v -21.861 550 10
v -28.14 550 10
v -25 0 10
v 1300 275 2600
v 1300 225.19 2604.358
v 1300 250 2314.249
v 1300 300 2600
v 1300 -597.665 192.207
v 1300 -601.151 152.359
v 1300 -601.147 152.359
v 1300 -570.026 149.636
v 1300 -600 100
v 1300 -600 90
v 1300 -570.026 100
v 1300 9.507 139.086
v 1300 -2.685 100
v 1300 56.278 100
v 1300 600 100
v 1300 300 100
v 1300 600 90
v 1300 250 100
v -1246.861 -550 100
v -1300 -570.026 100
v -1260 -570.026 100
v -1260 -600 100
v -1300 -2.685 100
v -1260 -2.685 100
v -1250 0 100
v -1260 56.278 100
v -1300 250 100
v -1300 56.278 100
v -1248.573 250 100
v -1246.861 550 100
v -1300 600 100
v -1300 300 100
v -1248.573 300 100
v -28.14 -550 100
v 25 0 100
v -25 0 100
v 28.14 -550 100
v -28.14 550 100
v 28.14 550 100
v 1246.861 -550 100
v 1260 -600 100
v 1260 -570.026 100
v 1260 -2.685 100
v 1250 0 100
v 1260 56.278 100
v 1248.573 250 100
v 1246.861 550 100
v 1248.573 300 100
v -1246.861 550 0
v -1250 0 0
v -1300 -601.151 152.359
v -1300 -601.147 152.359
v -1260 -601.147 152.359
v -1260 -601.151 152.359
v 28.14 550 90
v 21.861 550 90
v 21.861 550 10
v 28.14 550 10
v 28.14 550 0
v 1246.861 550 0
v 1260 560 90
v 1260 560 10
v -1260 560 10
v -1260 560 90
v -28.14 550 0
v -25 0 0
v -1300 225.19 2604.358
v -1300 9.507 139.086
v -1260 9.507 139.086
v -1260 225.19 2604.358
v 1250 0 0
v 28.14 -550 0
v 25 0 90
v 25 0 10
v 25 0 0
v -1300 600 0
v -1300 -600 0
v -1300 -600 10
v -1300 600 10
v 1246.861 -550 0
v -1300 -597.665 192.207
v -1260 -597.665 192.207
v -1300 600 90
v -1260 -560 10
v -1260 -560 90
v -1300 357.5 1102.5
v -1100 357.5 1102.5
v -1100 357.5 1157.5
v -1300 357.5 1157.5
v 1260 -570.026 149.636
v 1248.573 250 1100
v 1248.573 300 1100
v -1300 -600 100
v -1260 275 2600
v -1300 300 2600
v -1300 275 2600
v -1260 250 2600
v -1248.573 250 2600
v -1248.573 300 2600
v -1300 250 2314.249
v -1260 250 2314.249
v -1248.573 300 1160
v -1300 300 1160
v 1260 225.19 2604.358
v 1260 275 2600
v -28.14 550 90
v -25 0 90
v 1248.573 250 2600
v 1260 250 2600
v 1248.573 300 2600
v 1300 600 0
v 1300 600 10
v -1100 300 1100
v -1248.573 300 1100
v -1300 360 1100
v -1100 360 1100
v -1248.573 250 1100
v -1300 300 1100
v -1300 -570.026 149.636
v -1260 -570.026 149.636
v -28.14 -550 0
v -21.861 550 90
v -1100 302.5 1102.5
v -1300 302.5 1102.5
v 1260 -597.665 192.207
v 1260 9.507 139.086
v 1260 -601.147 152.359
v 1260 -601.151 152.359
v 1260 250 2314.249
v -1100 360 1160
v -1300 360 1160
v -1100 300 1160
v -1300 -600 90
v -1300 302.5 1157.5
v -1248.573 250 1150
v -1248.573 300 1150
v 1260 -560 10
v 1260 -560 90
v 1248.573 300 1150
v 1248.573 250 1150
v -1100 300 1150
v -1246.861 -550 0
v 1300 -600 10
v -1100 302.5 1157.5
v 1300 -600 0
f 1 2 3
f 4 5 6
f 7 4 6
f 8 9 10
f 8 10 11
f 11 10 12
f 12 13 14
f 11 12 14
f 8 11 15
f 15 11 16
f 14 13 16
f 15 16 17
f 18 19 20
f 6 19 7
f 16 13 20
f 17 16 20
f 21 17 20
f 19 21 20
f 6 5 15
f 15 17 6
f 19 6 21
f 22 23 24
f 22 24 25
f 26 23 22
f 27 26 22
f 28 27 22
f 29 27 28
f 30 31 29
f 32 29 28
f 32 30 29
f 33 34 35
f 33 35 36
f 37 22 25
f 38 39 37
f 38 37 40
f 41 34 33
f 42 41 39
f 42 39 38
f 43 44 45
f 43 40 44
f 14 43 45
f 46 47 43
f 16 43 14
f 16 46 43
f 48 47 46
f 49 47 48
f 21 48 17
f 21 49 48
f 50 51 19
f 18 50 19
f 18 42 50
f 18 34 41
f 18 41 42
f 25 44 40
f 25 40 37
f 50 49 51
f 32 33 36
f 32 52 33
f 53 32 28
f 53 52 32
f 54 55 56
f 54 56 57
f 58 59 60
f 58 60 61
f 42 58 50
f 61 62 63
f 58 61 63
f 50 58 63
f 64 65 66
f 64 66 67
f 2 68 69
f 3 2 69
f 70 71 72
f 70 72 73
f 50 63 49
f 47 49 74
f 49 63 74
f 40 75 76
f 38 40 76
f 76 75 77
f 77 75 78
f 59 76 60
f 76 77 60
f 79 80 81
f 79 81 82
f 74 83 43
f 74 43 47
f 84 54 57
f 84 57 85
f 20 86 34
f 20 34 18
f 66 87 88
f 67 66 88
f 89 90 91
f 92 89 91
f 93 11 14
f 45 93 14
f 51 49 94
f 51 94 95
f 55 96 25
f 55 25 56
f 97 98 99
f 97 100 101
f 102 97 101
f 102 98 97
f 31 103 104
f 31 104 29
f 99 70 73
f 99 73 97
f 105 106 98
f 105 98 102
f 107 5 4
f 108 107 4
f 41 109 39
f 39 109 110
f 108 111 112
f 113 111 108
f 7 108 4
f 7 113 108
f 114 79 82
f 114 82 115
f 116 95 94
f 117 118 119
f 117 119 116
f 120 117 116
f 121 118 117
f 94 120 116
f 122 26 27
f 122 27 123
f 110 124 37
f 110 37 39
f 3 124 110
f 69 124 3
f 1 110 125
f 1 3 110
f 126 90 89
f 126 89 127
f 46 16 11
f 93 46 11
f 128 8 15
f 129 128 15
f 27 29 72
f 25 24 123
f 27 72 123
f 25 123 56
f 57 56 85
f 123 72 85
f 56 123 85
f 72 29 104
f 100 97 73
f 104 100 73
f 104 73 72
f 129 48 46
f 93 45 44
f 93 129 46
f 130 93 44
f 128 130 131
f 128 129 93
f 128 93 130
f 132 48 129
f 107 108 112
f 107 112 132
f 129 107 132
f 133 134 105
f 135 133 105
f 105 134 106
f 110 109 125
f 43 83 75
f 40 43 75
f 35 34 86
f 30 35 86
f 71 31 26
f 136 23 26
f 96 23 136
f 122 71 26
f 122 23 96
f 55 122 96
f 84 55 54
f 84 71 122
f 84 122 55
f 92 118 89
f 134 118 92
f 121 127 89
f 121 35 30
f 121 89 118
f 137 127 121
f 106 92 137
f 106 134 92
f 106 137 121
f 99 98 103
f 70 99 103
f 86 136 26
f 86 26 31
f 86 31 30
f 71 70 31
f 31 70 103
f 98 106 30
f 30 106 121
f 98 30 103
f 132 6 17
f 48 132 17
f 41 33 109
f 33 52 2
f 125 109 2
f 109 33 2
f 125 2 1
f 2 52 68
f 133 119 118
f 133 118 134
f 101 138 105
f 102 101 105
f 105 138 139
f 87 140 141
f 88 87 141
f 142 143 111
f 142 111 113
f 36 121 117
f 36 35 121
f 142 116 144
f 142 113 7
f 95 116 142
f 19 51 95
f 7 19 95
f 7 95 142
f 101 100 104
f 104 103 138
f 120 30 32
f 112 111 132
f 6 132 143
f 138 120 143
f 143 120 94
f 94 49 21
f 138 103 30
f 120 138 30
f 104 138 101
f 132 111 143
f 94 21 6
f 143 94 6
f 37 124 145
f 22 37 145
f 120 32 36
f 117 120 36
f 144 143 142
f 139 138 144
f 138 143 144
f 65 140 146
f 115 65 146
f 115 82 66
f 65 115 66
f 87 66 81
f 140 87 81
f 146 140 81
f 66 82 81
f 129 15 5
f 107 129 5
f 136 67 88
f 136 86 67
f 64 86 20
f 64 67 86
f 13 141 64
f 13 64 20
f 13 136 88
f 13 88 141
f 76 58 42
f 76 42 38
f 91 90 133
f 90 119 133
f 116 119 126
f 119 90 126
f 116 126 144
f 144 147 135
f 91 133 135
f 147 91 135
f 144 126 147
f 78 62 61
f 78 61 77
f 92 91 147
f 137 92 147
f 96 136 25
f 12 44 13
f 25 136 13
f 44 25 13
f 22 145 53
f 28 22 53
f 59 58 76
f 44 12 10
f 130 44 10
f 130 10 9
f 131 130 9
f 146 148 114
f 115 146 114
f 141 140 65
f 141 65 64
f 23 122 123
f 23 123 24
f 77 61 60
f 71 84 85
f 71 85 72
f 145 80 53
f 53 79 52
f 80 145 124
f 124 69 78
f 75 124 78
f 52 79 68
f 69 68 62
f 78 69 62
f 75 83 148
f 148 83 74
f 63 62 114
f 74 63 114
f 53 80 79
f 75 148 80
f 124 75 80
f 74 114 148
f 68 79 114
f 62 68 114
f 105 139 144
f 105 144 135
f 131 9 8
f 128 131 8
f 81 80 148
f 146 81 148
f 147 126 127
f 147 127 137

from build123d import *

# Parameters (mm, degrees)
F0_W          = 2600
F0_H          = 1200
F1_DEPTH      = 100
F2_W          = 40
F2_H          = 80
F3_DEPTH      = 2600.001
F4_W          = 40
F4_H          = 80
F5_DEPTH      = 1160.001
F6_W          = 90
F6_H          = 80
F7_DEPTH      = 550
F7_DEPTH_BACK = 550
F8_W          = 48.5726841614
F8_H          = 50
F8_W_2        = 51.4265014179
F9_DEPTH      = 2500
F11_DEPTH     = 40
F13_W         = 50
F13_H         = 50
F14_DEPTH     = 2497.1469971642
F15_W         = 60
F15_H         = 60
F15_W_2       = 55
F15_H_2       = 55
F16_DEPTH     = 200


with BuildPart() as f1:
    # F0 (on Top) → F1 (new body)
    with BuildSketch(Plane.XY):
        Rectangle(F0_W, F0_H)
        Polygon((-1246.8612082282, -550), (-1253.1396061924, 550), (-28.1396061924, 550), (-21.8612082282, -550), align=None, mode=Mode.SUBTRACT)
        Polygon((21.8612082282, 550), (1246.8612082282, 550), (1253.1396061924, -550), (28.1396061924, -550), align=None, mode=Mode.SUBTRACT)
    extrude(amount=F1_DEPTH)

    # F2 (on face) → F3 (cut, through all)
    with BuildSketch(Plane(origin=(-1300, 0, 0), x_dir=(0, -1, 0), z_dir=(-1, 0, 0))):
        with Locations((-580, 50)):
            Rectangle(F2_W, F2_H)
        with Locations((580, 50)):
            Rectangle(F2_W, F2_H)
    extrude(amount=-F3_DEPTH, mode=Mode.SUBTRACT)

    # F4 (on face) → F5 (cut, through all)
    with BuildSketch(Plane.XZ.offset(560)):
        with Locations((1280, 50)):
            Rectangle(F4_W, F4_H)
        with Locations((-1280, 50)):
            Rectangle(F4_W, F4_H)
    extrude(amount=-F5_DEPTH, mode=Mode.SUBTRACT)

    # F6 (on Front) → F7 (cut, two sides)
    with BuildSketch(Plane.XZ) as f7_sk:
        with Locations((-45, 50)):
            Rectangle(F6_W, F6_H)
    extrude(amount=-F7_DEPTH, mode=Mode.SUBTRACT)
    extrude(f7_sk.sketch, amount=F7_DEPTH_BACK, mode=Mode.SUBTRACT)

    # F8 (on face) → F9 (join)
    with BuildSketch(Plane.XY.offset(100)):
        with Locations((-1275.7136579193, 275)):
            Rectangle(F8_W, F8_H)
        with Locations((1274.286749291, 275)):
            Rectangle(F8_W_2, F8_H)
    extrude(amount=F9_DEPTH)

    # F10 (on face) → F11 (join)
    with BuildSketch(Plane(origin=(-1300, 0, 0), x_dir=(0, -1, 0), z_dir=(-1, 0, 0))):
        Polygon((-56.2783411852, 100), (-56.1893342614, 98.9826462062), (-5.9983423843, 98.9826462062), (-6.0207137863, 99.238352502), (-6.087349308, 100), align=None)
        Polygon((-250, 2314.248692431), (-56.2783411852, 100), (-6.087349308, 100), (-9.5069434963, 139.0861404257), (-225.1902650954, 2604.3577871374), (-275, 2600), (-250, 2600), align=None)
        Polygon((-9.5069434963, 139.0861404257), (-6.087349308, 100), (2.684956952, 100), (570.0262784958, 149.6359339849), (601.1466387735, 152.358612714), (601.1508236042, 152.3589788393), (597.6645938943, 192.206766763), align=None)
        Polygon((601.1466387735, 152.358612714), (570.0262784958, 149.6359339849), (570.0262784958, 100), (600, 100), align=None)
    extrude(amount=-F11_DEPTH)

    # F12: F1 across plane


with BuildPart() as f1_1:
    add(f1.part)
    add(f1.part.mirror(Plane.YZ))

    # F13 (on face) → F14 (join, through all)
    with BuildSketch(Plane.YZ.offset(-1248.5734985821)):
        with Locations((275, 1125)):
            Rectangle(F13_W, F13_H)
    extrude(amount=F14_DEPTH)

    # F15 (on face) → F16 (join)
    with BuildSketch(Plane(origin=(-1300, 0, 0), x_dir=(0, -1, 0), z_dir=(-1, 0, 0))):
        with Locations((-330, 1130)):
            Rectangle(F15_W, F15_H)
        with Locations((-330, 1130)):
            Rectangle(F15_W_2, F15_H_2, mode=Mode.SUBTRACT)
    extrude(amount=-F16_DEPTH)


solid = f1_1.part
